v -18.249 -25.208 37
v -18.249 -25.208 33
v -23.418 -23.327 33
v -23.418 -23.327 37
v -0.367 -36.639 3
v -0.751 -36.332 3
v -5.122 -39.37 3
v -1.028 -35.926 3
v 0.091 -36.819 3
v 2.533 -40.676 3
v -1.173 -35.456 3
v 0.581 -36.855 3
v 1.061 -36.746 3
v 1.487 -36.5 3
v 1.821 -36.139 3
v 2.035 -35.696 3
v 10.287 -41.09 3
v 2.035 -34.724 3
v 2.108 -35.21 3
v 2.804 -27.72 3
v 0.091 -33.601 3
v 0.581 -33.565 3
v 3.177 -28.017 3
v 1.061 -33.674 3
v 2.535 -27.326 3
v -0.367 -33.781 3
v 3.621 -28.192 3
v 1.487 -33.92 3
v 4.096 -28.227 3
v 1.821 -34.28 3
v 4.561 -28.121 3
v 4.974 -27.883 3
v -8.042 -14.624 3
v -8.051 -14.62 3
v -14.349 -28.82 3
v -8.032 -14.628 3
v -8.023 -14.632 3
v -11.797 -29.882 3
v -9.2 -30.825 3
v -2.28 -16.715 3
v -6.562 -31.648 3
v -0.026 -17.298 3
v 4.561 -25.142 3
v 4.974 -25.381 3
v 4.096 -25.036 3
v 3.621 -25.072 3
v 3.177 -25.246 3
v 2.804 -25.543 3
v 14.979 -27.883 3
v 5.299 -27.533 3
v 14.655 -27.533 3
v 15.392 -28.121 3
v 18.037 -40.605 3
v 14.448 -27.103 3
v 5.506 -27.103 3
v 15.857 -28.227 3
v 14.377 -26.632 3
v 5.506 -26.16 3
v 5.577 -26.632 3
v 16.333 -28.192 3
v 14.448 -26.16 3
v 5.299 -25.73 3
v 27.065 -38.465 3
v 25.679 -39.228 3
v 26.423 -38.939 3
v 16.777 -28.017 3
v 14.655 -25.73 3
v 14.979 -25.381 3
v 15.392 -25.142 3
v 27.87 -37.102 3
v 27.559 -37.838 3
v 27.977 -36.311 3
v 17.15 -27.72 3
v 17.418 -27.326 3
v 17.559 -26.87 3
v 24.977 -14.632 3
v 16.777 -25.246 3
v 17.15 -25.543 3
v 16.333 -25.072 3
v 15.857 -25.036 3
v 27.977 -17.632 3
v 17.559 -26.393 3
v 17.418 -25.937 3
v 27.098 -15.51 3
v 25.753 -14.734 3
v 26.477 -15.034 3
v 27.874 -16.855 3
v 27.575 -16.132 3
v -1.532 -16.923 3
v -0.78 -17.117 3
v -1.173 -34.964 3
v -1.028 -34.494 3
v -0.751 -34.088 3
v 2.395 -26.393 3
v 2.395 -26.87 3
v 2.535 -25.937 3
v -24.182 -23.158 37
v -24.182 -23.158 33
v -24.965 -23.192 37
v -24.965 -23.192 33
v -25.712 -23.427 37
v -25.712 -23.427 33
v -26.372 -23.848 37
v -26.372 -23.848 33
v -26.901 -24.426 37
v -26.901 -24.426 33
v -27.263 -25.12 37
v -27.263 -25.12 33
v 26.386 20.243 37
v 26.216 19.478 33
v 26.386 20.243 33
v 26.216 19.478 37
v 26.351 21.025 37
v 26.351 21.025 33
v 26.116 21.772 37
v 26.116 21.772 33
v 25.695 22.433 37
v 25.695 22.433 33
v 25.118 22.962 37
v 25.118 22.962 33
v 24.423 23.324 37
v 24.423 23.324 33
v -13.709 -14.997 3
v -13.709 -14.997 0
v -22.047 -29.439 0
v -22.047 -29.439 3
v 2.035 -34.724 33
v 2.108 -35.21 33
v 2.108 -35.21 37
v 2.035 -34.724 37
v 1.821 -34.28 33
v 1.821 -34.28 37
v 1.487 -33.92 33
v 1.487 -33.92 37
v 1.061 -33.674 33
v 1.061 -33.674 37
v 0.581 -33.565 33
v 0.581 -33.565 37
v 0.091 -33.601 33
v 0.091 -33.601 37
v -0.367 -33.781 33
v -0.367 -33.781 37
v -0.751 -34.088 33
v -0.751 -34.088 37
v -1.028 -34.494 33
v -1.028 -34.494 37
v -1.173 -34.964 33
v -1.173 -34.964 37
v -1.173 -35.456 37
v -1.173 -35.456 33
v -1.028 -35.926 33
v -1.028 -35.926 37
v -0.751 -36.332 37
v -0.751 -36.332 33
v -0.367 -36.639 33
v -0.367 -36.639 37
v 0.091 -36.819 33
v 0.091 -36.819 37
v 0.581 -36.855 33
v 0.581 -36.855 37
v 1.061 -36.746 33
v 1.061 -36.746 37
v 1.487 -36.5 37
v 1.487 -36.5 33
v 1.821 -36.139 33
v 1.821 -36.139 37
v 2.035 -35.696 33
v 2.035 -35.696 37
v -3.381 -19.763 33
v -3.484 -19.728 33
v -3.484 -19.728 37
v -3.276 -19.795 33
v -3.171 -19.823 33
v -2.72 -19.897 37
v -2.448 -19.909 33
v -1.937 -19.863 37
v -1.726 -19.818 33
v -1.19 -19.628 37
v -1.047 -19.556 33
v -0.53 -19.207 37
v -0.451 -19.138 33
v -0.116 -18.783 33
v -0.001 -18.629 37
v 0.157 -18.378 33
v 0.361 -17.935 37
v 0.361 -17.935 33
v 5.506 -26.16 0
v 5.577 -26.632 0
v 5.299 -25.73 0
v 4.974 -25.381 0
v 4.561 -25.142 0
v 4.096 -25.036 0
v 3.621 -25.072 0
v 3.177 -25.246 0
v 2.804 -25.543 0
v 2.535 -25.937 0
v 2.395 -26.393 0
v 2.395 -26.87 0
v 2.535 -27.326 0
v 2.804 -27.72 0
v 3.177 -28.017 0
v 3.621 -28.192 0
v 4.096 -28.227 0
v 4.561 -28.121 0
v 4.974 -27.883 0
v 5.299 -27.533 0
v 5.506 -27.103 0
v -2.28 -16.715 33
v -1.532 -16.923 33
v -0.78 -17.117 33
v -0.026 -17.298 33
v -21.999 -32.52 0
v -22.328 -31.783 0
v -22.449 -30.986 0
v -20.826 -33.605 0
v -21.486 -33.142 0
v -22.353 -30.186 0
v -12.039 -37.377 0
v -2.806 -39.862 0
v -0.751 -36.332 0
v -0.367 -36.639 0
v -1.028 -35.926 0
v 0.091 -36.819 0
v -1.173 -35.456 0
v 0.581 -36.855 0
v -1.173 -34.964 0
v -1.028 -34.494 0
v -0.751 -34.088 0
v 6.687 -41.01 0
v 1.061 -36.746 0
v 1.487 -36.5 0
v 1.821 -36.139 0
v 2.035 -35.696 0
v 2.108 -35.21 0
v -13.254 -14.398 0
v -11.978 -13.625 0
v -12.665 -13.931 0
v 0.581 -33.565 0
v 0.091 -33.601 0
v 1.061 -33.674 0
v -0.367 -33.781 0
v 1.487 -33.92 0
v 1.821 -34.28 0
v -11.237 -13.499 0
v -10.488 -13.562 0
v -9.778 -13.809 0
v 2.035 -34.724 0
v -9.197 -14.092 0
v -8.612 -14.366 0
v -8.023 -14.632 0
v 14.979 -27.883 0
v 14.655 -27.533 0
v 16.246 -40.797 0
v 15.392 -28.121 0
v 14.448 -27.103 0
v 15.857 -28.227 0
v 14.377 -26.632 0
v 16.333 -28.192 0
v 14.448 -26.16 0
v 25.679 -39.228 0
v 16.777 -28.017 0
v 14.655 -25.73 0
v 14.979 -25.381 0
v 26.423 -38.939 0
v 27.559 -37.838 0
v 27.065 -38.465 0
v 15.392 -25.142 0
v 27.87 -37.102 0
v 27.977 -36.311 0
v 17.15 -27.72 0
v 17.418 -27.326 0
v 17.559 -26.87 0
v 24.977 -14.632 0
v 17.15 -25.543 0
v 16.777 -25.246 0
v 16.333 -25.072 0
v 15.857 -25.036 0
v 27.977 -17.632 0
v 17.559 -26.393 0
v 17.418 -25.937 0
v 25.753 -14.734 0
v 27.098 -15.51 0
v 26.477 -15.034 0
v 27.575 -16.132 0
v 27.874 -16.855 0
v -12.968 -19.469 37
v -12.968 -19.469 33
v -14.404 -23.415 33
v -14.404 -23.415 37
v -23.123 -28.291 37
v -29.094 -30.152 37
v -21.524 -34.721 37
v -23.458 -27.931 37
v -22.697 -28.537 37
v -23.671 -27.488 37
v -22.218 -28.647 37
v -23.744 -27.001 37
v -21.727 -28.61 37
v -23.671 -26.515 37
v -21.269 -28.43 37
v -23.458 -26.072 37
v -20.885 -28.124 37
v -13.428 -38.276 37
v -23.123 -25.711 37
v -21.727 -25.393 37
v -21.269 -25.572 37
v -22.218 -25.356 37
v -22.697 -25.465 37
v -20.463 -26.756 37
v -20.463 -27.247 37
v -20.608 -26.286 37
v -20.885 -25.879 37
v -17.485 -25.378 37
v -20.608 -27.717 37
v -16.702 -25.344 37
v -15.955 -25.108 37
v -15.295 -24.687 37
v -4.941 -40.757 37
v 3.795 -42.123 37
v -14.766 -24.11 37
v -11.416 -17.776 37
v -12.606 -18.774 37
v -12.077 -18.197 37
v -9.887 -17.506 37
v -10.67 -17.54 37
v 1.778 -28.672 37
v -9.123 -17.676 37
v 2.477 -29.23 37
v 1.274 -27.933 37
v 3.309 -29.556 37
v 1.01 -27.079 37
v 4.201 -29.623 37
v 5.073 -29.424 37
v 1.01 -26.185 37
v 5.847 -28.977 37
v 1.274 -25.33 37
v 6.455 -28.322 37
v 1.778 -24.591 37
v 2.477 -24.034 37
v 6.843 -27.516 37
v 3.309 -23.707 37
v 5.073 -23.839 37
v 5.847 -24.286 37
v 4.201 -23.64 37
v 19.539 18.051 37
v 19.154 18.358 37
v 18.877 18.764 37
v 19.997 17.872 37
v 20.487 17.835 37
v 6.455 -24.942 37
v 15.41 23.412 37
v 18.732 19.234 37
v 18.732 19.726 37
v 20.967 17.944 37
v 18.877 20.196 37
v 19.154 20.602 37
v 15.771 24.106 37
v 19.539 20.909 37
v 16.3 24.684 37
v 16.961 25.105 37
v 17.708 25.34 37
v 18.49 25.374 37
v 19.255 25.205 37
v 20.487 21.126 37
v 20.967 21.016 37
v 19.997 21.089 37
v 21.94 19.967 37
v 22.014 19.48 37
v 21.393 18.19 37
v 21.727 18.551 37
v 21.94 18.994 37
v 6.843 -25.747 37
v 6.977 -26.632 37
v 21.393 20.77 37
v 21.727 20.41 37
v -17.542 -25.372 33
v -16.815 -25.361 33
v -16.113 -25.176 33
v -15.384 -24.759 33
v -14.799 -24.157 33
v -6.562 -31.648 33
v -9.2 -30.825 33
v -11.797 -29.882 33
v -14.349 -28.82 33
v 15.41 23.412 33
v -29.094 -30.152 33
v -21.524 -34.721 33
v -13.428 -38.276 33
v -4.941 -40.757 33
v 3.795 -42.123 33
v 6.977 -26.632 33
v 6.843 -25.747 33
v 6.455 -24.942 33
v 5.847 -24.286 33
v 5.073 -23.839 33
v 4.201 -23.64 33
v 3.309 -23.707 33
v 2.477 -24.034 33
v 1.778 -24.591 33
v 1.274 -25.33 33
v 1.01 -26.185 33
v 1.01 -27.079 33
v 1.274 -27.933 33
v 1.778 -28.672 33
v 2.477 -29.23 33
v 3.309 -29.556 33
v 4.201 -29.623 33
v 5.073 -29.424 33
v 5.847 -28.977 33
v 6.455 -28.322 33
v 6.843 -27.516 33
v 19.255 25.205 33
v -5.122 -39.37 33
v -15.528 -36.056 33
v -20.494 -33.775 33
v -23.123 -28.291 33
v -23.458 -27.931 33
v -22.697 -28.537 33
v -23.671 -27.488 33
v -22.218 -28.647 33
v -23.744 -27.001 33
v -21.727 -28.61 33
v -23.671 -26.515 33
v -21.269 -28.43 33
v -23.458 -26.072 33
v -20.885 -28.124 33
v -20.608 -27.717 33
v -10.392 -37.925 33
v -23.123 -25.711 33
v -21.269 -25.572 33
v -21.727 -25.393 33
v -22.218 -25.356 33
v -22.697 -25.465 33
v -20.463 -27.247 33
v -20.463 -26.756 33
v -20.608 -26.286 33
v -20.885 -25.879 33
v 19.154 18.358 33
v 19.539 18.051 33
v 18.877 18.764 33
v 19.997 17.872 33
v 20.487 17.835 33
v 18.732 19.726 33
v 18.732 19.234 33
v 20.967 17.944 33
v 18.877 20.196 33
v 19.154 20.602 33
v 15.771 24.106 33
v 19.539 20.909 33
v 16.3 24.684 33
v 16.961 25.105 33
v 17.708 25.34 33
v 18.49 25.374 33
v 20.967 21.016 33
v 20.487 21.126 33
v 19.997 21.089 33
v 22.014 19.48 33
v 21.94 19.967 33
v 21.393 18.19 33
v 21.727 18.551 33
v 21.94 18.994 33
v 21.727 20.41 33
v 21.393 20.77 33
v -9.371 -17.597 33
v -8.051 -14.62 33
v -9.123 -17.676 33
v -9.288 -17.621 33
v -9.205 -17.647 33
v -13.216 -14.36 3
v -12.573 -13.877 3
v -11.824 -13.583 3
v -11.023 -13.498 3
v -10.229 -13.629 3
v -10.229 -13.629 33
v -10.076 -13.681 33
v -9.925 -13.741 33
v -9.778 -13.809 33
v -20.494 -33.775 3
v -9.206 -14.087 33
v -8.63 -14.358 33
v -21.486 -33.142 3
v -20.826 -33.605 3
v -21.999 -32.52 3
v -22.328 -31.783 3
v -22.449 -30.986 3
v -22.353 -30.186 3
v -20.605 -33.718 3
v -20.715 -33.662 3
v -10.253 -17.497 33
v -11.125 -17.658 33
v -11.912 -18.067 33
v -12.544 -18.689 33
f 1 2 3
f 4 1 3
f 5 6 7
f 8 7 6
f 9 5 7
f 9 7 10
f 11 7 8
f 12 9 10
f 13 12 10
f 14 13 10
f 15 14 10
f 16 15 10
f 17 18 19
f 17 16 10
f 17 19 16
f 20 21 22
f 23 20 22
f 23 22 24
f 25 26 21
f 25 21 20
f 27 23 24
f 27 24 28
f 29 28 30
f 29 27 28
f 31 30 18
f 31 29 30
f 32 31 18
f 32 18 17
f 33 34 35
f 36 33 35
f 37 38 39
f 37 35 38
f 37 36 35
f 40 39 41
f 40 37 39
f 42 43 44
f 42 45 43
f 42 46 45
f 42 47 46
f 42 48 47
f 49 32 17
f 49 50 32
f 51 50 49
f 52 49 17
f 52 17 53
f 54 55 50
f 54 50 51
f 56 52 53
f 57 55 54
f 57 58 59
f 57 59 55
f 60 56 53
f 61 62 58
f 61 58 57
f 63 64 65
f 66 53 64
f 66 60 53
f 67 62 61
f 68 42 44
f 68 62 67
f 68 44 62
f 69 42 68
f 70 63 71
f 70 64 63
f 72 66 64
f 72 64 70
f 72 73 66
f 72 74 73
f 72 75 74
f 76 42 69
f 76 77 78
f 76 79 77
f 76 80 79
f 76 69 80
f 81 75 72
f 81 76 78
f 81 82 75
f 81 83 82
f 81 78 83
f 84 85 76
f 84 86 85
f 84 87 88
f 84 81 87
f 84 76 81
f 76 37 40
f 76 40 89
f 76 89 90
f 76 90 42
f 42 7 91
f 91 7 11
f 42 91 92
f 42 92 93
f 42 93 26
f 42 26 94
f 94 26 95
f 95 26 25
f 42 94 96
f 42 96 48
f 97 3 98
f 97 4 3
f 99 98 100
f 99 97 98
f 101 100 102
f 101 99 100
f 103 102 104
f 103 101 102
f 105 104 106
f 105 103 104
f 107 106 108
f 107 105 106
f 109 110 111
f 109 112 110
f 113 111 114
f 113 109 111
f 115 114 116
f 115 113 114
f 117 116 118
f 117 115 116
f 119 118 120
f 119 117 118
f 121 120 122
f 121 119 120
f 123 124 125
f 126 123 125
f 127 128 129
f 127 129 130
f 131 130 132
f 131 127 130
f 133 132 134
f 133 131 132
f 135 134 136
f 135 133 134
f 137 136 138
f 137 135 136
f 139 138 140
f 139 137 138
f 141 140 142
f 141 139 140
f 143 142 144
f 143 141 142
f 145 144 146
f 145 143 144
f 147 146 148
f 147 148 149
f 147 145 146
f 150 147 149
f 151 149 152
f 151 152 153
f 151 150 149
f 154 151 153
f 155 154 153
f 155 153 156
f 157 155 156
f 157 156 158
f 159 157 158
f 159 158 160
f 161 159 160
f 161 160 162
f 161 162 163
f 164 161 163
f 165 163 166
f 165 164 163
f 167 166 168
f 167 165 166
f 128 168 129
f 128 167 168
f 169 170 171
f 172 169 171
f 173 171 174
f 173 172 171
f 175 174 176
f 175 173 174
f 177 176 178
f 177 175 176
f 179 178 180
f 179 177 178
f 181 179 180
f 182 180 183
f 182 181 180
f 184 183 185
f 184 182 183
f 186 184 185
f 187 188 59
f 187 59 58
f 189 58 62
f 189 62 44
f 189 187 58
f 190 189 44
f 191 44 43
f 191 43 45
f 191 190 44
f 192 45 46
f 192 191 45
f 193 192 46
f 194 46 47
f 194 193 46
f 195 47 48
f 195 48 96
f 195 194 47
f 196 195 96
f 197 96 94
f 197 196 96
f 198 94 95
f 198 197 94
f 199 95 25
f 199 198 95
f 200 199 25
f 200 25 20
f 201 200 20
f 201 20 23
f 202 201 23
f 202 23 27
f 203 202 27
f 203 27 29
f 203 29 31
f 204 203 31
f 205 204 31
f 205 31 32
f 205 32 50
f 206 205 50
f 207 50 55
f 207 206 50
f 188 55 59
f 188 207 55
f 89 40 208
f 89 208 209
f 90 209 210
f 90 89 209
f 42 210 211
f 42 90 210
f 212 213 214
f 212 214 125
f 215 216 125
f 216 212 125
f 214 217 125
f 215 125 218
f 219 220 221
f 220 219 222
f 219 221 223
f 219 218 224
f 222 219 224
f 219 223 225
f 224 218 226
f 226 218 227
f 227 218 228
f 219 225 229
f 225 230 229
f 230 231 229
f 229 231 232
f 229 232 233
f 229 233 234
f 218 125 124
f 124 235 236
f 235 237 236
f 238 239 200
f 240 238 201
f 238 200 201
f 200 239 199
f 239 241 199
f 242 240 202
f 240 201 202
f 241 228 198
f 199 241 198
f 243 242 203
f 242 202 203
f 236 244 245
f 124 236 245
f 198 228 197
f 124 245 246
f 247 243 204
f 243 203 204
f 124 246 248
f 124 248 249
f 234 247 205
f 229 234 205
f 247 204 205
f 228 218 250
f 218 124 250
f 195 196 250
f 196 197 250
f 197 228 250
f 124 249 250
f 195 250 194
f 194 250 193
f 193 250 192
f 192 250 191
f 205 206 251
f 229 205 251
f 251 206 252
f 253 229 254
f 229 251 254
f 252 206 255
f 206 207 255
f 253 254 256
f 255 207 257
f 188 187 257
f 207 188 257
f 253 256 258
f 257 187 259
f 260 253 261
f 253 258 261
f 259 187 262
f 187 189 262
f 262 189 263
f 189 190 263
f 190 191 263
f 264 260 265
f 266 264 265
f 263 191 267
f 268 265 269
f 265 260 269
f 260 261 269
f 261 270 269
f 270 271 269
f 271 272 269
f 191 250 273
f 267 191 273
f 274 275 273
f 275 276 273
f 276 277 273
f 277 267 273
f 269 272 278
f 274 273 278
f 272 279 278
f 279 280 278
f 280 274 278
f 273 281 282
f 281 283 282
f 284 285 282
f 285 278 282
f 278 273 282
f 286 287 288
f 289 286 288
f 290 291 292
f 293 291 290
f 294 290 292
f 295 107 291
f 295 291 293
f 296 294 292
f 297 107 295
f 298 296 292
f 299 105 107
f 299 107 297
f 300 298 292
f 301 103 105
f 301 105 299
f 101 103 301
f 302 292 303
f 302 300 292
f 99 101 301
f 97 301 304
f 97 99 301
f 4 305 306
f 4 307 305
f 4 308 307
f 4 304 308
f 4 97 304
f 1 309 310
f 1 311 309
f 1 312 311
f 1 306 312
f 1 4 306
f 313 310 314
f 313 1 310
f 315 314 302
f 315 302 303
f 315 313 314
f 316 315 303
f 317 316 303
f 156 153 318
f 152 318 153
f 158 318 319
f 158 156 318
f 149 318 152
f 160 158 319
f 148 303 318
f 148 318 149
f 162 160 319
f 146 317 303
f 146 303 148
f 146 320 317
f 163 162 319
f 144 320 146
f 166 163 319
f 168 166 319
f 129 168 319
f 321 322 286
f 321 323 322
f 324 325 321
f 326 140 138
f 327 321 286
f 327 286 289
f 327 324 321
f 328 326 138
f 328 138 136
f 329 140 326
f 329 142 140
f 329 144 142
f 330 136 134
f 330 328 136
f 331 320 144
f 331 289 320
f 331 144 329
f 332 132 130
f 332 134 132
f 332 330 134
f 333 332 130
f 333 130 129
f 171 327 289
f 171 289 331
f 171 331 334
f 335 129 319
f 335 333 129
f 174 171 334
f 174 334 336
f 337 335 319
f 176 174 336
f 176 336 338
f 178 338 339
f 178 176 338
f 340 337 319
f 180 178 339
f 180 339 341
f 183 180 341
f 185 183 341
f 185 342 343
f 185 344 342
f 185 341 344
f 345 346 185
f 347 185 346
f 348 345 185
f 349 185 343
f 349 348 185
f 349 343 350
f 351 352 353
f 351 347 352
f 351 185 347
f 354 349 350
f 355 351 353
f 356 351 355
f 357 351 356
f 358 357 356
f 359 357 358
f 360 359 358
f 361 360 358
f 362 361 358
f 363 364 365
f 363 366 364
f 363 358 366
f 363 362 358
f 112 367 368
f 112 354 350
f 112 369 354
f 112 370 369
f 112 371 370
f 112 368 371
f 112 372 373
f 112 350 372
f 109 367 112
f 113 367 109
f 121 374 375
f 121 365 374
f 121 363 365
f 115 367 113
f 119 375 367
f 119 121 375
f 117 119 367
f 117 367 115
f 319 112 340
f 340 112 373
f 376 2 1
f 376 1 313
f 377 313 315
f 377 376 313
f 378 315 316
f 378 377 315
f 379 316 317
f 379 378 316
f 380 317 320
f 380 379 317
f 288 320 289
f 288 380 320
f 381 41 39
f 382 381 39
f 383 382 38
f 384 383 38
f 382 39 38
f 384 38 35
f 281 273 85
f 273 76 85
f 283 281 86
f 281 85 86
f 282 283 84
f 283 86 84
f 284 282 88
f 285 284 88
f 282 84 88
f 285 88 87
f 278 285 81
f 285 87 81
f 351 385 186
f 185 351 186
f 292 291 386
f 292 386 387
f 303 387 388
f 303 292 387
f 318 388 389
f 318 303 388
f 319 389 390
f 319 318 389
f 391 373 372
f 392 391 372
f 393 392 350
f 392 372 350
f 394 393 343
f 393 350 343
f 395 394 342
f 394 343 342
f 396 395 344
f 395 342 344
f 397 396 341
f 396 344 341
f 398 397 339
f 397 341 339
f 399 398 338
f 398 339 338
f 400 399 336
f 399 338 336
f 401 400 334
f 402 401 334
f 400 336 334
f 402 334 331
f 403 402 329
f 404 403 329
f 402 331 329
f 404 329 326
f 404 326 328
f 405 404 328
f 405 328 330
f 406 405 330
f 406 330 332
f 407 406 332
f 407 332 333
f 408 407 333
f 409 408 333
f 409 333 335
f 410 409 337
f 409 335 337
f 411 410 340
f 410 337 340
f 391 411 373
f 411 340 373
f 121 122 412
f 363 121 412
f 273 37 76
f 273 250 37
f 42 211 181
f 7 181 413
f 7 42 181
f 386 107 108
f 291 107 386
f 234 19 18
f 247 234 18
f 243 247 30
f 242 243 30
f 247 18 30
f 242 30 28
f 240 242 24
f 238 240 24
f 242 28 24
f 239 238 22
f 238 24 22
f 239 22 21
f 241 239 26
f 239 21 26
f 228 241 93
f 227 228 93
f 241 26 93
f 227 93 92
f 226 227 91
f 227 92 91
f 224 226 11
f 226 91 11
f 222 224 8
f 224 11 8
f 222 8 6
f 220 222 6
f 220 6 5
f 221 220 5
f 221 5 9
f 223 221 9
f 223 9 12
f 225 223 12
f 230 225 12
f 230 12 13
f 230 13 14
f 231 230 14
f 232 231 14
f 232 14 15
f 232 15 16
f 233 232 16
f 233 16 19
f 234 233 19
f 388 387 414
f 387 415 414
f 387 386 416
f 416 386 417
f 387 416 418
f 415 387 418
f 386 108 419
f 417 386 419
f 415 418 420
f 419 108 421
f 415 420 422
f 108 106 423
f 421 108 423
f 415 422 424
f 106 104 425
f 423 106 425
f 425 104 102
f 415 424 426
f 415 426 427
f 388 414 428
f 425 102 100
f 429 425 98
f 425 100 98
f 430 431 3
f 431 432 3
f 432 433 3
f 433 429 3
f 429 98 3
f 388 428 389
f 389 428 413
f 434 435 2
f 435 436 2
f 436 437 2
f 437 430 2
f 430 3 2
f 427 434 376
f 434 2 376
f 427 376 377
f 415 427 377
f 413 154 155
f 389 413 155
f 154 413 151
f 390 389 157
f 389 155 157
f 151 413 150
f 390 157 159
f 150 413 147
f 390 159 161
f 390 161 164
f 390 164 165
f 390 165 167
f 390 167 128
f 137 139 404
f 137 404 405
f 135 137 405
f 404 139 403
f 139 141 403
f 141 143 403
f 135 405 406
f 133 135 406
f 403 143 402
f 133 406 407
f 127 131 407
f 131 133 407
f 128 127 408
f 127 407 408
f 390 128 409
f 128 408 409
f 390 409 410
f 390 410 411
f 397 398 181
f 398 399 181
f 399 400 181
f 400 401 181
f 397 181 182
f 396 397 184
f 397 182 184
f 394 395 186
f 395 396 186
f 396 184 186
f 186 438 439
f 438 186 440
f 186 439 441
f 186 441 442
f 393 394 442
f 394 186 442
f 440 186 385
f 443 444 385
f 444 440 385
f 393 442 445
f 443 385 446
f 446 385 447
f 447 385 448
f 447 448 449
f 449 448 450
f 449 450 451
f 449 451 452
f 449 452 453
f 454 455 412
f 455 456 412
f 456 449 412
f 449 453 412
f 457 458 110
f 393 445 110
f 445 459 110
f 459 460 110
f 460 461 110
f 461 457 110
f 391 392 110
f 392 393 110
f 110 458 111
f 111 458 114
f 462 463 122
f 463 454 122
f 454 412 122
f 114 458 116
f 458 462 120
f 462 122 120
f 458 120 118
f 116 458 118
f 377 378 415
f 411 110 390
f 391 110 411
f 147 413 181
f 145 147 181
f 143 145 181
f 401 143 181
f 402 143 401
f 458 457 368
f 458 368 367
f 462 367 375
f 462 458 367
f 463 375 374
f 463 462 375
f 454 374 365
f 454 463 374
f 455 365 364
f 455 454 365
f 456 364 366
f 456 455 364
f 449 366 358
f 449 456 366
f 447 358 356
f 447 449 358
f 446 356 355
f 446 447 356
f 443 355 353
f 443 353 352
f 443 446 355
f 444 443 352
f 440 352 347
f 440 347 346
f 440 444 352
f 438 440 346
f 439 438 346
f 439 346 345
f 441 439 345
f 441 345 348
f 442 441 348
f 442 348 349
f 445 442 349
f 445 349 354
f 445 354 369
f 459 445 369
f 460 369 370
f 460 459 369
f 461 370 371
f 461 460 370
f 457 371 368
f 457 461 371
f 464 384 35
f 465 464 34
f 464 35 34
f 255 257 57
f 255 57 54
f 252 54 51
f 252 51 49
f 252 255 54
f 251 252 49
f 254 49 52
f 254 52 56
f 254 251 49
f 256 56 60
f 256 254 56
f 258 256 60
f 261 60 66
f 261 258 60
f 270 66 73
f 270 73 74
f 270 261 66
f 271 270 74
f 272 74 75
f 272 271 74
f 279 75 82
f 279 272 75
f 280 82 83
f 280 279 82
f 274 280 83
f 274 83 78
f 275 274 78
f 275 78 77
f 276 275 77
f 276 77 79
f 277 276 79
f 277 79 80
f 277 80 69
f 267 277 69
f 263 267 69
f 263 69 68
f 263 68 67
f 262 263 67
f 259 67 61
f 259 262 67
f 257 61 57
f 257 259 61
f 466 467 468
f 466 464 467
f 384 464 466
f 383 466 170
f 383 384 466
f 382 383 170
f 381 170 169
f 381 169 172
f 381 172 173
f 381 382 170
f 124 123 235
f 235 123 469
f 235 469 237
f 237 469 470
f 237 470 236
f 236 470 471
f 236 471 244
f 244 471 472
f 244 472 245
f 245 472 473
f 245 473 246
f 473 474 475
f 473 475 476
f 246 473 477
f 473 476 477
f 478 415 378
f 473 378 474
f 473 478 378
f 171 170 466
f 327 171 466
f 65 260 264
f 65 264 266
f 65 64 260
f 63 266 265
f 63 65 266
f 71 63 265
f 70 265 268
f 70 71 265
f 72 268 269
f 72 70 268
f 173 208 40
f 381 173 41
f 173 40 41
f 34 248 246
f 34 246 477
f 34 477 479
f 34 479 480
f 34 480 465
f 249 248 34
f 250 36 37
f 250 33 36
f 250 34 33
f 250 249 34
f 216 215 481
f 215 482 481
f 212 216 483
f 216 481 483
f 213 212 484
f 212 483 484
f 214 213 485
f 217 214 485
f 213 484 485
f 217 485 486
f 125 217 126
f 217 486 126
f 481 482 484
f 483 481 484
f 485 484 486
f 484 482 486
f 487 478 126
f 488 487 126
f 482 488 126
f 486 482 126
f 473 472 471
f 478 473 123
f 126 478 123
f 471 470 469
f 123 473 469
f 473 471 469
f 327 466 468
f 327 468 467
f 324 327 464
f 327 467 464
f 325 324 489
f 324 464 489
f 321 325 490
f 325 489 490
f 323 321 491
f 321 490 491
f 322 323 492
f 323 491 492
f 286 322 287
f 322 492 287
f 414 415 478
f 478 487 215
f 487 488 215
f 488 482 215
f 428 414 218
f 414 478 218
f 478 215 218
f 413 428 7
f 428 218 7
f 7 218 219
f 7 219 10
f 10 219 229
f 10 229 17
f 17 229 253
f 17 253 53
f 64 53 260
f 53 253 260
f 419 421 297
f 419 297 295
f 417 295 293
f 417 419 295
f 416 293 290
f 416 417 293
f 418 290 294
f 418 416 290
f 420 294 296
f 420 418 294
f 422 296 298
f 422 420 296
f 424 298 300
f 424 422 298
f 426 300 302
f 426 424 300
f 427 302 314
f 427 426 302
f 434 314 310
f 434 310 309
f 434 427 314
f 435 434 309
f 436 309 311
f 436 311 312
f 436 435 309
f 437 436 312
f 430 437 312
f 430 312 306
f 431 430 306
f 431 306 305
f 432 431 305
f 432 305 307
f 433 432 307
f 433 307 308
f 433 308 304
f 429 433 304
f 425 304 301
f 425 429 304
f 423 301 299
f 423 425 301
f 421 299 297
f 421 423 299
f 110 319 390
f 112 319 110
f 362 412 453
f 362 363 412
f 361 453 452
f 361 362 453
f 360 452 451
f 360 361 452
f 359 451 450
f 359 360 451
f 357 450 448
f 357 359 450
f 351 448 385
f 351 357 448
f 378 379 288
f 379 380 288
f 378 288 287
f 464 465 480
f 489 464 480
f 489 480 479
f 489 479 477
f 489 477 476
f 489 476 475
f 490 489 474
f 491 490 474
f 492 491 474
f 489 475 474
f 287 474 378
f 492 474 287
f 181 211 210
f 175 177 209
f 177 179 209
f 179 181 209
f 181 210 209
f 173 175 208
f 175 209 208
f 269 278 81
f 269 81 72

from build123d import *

# Parameters (mm, degrees)
SKETCH_1_R          = 1.600000000000001
SKETCH_1_R_2        = 1.6000000000000019
SKETCH_1_R_3        = 1.5999999999999985
EXTRUDE_1_DEPTH     = 3
EXTRUDE_2_DEPTH     = 30
CUT_EXTRUDE_1_DEPTH = 40
SKETCH_4_R          = 1.6499999999999986
SKETCH_4_R_2        = 1.6499999999999997
EXTRUDE_3_DEPTH     = 4
CUT_EXTRUDE_START   = -3
CUT_EXTRUDE_5_DEPTH = 3
EXTRUDE_4_DEPTH     = 3
FILLET_2_R          = 3
EXTRUDE_5_DEPTH     = 4
SKETCH_10_R         = 2.9999999999999996
CUT_EXTRUDE_6_DEPTH = 4
SKETCH_11_R         = 1.6500000000000008
CUT_EXTRUDE_7_DEPTH = 62.45571715470519


with BuildPart() as part:
    # 草图1 → 凸台-拉伸1 (new body)
    with BuildSketch(Plane.XY):
        with BuildLine():
            Line((-8.023322075989554, -14.631711796201198), (27.976677924010442, -14.631711796201193))
            Line((27.976677924010442, -14.631711796201193), (27.976677924010446, -38.631711796201195))
            Line((27.976677924010446, -38.631711796201195), (-8.023322075989551, -38.6317117962012))
            ThreePointArc((-8.023322075989551, -38.6317117962012), (-43.46930578748299, -14.57230150362017), (-57.14129859782335, 26.027570386525145))
            Line((-57.14129859782335, 26.027570386525145), (-34.48878313976992, 26.027570386525145))
            ThreePointArc((-34.48878313976992, 26.027570386525145), (-27.28963076602897, 1.7706236653637966), (-8.023322075989554, -14.631711796201198))
        make_face()
        with Locations((3.976677924010446, -26.6317117962012)):
            Circle(SKETCH_1_R, mode=Mode.SUBTRACT)
        with Locations(Location((15.976677924010446, -26.6317117962012, 0), (0, 0, 180))):
            Circle(SKETCH_1_R_2, mode=Mode.SUBTRACT)
        with Locations((-42.682604258715905, 20.02757038652514)):
            Circle(SKETCH_1_R_3, mode=Mode.SUBTRACT)
    extrude(amount=EXTRUDE_1_DEPTH)

    # 草图2 → 凸台-拉伸2 (add)
    with BuildSketch(Plane.XY.offset(3)):
        with BuildLine():
            Line((-20.49424577864387, -33.77498458475056), (-10.210218965484446, -13.591445522347069))
            ThreePointArc((-10.210218965484446, -13.591445522347069), (-5.231405442065514, -15.756295254952452), (-0.02587442417285965, -17.298243790895924))
            Line((-0.02587442417285965, -17.298243790895924), (-5.121581660002594, -39.370176745308015))
            ThreePointArc((-5.121581660002594, -39.370176745308015), (-12.979022025715798, -37.042696873124), (-20.49424577864387, -33.77498458475056))
        make_face()
    extrude(amount=EXTRUDE_2_DEPTH)

    # 草图3 → 切除-拉伸1 (cut)
    with BuildSketch(Plane.XY.offset(3)):
        with BuildLine():
            Line((-14.348702760927614, -28.820181203971632), (-7.456511566861831, -13.279984919997544))
            ThreePointArc((-7.456511566861831, -13.279984919997544), (-4.701142282615541, -14.38977235123981), (-1.875728376120071, -15.30668253882269))
            Line((-1.875728376120071, -15.30668253882269), (-6.561563425008877, -31.648131369774166))
            ThreePointArc((-6.561563425008877, -31.648131369774166), (-10.504001434072327, -30.368721805705025), (-14.348702760927614, -28.820181203971632))
        make_face()
    extrude(amount=CUT_EXTRUDE_1_DEPTH, mode=Mode.SUBTRACT)

    # 草图4 → 凸台-拉伸3 (add)
    with BuildSketch(Plane.XY.offset(33)):
        Polygon((-27.87837659400939, -26.811760111104594), (5.010865133497435, -38.782465127502874), (27.24217444966564, 22.297555223581274), (16.435709310627683, 26.230786871826414), (-0.6652978556555434, -20.753844167469087), (-11.941609305086462, -16.649602447561108), (-15.43021476700824, -26.234467179577372), (-26.236679906046202, -22.30123553133223), align=None)
        with Locations((20.36376431871485, 19.48020290794287)):
            Circle(SKETCH_4_R, mode=Mode.SUBTRACT)
        with Locations((0.4581919771611356, -35.20990762179707)):
            Circle(SKETCH_4_R_2, mode=Mode.SUBTRACT)
        with Locations(Location((-22.094430921700695, -27.001424181981108, 0), (0, 0, 180))):
            Circle(SKETCH_4_R, mode=Mode.SUBTRACT)
    extrude(amount=EXTRUDE_3_DEPTH)

    # 草图7 → 切除-拉伸5 (cut)
    with BuildSketch(Plane.XY.offset(3).offset(CUT_EXTRUDE_START)):
        with BuildLine():
            Line((-12.256052607879635, -12.480648485696536), (-23.582310336906296, -32.09830233199053))
            ThreePointArc((-23.582310336906296, -32.09830233199053), (-48.149194794505114, -7.53141787439181), (-57.14129859782335, 26.027570386525152))
            Line((-57.14129859782335, 26.027570386525152), (-34.48878313976992, 26.027570386525145))
            ThreePointArc((-34.48878313976992, 26.027570386525145), (-28.53154094821116, 3.794839854634926), (-12.256052607879635, -12.480648485696536))
        make_face()
    extrude(amount=CUT_EXTRUDE_5_DEPTH, mode=Mode.SUBTRACT)

    # 草图8 → 凸台-拉伸4 (add)
    with BuildSketch(Plane(origin=(0, 0, 0), x_dir=(-1, 0, 0), z_dir=(0, 0, -1))):
        with BuildLine():
            Line((-27.976677924010446, -38.631711796201195), (8.023322075989551, -38.6317117962012))
            ThreePointArc((8.023322075989551, -38.6317117962012), (-9.97667792401045, -41.090406135308655), (-27.976677924010446, -38.631711796201195))
        make_face()
    extrude(amount=-EXTRUDE_4_DEPTH)

    # 圆角2
    fillet_2_edges = [part.edges().sort_by_distance(p)[0] for p in [
        (-26.236679906046202, -22.30123553133223, 35),
    ]]
    fillet(fillet_2_edges, radius=FILLET_2_R)
    fillet_2_2_edges = [part.edges().sort_by_distance(p)[0] for p in [
        (27.24217444966564, 22.297555223581274, 35),
    ]]
    fillet(fillet_2_2_edges, radius=FILLET_2_R)
    fillet_2_3_edges = [part.edges().sort_by_distance(p)[0] for p in [
        (16.435709310627683, 26.230786871826414, 35),
    ]]
    fillet(fillet_2_3_edges, radius=FILLET_2_R)
    fillet_2_4_edges = [part.edges().sort_by_distance(p)[0] for p in [
        (27.976677924010446, -38.631711796201195, 1.5),
    ]]
    fillet(fillet_2_4_edges, radius=FILLET_2_R)
    fillet_2_5_edges = [part.edges().sort_by_distance(p)[0] for p in [
        (-23.5823103369063, -32.09830233199054, 1.5),
    ]]
    fillet(fillet_2_5_edges, radius=FILLET_2_R)
    fillet_2_6_edges = [part.edges().sort_by_distance(p)[0] for p in [
        (-12.256052607879633, -12.480648485696538, 1.5),
    ]]
    fillet(fillet_2_6_edges, radius=FILLET_2_R)
    fillet_2_7_edges = [part.edges().sort_by_distance(p)[0] for p in [
        (27.976677924010442, -14.631711796201193, 1.5),
    ]]
    fillet(fillet_2_7_edges, radius=FILLET_2_R)
    # the kernel refuses this fillet: 3 mm, written as the material it adds along each edge
    with BuildSketch(Plane(origin=(-0.6652978556555434, -20.753844167469087, 33), x_dir=(-0.93969262078591, 0.34202014332566444, 0), z_dir=(0, 0, 1))) as fillet_2_8_piece_1:
        with BuildLine():
            CenterArc((FILLET_2_R, -FILLET_2_R), FILLET_2_R, 89.99999999999999, 90.00000000000001)
            Line((5e-17, -FILLET_2_R), (-FILLET_2_R * 0.02, -FILLET_2_R))
            Line((-FILLET_2_R * 0.02, -FILLET_2_R), (-FILLET_2_R * 0.02, FILLET_2_R * 0.02))
            Line((-FILLET_2_R * 0.02, FILLET_2_R * 0.02), (FILLET_2_R, FILLET_2_R * 0.02))
            Line((FILLET_2_R, FILLET_2_R * 0.02), (FILLET_2_R, -5e-17))
        make_face()
    extrude(amount=4)
    # the kernel refuses this fillet: 3 mm, written as the material it takes off along each edge
    with BuildSketch(Plane(origin=(-11.941609305086462, -16.649602447561108, 33), x_dir=(0.9396926207859099, -0.3420201433256647, 0), z_dir=(0, 0, 1))) as fillet_2_9_piece_1:
        with BuildLine():
            CenterArc((FILLET_2_R, -FILLET_2_R), FILLET_2_R, 89.99999999999997, 90)
            Line((-2.84e-15, -FILLET_2_R), (-FILLET_2_R * 0.02, -FILLET_2_R))
            Line((-FILLET_2_R * 0.02, -FILLET_2_R), (-FILLET_2_R * 0.02, FILLET_2_R * 0.02))
            Line((-FILLET_2_R * 0.02, FILLET_2_R * 0.02), (FILLET_2_R, FILLET_2_R * 0.02))
            Line((FILLET_2_R, FILLET_2_R * 0.02), (FILLET_2_R, -5e-17))
        make_face()
    extrude(amount=11.5, mode=Mode.SUBTRACT)
    # the kernel refuses this fillet: 3 mm, written as the material it adds along each edge
    with BuildSketch(Plane(origin=(-15.43021476700824, -26.234467179577372, 33), x_dir=(0.34202014332566544, 0.9396926207859095, 0), z_dir=(0, 0, 1))) as fillet_2_10_piece_1:
        with BuildLine():
            CenterArc((FILLET_2_R, FILLET_2_R), FILLET_2_R, 180.00000000000006, 90)
            Line((-5.63e-15, FILLET_2_R), (-FILLET_2_R * 0.02, FILLET_2_R))
            Line((-FILLET_2_R * 0.02, FILLET_2_R), (-FILLET_2_R * 0.02, -FILLET_2_R * 0.02))
            Line((-FILLET_2_R * 0.02, -FILLET_2_R * 0.02), (FILLET_2_R, -FILLET_2_R * 0.02))
            Line((FILLET_2_R, -FILLET_2_R * 0.02), (FILLET_2_R, 9e-17))
        make_face()
    extrude(amount=4)

    # 草图9 → 凸台-拉伸5 (add)
    with BuildSketch(Plane.XY.offset(37.00000000000001)):
        with BuildLine():
            Line((-27.87837659400939, -26.811760111104594), (-29.094175630850113, -30.152140511419198))
            ThreePointArc((-29.094175630850113, -30.152140511419198), (-13.427826993623084, -38.27577838818826), (3.79506609665671, -42.12284552781748))
            Line((3.79506609665671, -42.12284552781748), (5.010865133497435, -38.782465127502874))
            Line((5.010865133497435, -38.782465127502874), (-27.87837659400939, -26.811760111104594))
        make_face()
    extrude(amount=-EXTRUDE_5_DEPTH)

    # 草图10 → 切除-拉伸6 (cut)
    with BuildSketch(Plane.XY.offset(37.00000000000001)):
        with Locations((3.976677924010446, -26.6317117962012)):
            Circle(SKETCH_10_R)
    extrude(amount=-CUT_EXTRUDE_6_DEPTH, mode=Mode.SUBTRACT)

    # 草图11 → 切除-拉伸7 (cut, through all)
    with BuildSketch(Plane.XY.offset(3)):
        with Locations((0.4581919771611356, -35.20990762179707)):
            Circle(SKETCH_11_R)
    extrude(amount=-CUT_EXTRUDE_7_DEPTH, mode=Mode.SUBTRACT)


solid = part.part
